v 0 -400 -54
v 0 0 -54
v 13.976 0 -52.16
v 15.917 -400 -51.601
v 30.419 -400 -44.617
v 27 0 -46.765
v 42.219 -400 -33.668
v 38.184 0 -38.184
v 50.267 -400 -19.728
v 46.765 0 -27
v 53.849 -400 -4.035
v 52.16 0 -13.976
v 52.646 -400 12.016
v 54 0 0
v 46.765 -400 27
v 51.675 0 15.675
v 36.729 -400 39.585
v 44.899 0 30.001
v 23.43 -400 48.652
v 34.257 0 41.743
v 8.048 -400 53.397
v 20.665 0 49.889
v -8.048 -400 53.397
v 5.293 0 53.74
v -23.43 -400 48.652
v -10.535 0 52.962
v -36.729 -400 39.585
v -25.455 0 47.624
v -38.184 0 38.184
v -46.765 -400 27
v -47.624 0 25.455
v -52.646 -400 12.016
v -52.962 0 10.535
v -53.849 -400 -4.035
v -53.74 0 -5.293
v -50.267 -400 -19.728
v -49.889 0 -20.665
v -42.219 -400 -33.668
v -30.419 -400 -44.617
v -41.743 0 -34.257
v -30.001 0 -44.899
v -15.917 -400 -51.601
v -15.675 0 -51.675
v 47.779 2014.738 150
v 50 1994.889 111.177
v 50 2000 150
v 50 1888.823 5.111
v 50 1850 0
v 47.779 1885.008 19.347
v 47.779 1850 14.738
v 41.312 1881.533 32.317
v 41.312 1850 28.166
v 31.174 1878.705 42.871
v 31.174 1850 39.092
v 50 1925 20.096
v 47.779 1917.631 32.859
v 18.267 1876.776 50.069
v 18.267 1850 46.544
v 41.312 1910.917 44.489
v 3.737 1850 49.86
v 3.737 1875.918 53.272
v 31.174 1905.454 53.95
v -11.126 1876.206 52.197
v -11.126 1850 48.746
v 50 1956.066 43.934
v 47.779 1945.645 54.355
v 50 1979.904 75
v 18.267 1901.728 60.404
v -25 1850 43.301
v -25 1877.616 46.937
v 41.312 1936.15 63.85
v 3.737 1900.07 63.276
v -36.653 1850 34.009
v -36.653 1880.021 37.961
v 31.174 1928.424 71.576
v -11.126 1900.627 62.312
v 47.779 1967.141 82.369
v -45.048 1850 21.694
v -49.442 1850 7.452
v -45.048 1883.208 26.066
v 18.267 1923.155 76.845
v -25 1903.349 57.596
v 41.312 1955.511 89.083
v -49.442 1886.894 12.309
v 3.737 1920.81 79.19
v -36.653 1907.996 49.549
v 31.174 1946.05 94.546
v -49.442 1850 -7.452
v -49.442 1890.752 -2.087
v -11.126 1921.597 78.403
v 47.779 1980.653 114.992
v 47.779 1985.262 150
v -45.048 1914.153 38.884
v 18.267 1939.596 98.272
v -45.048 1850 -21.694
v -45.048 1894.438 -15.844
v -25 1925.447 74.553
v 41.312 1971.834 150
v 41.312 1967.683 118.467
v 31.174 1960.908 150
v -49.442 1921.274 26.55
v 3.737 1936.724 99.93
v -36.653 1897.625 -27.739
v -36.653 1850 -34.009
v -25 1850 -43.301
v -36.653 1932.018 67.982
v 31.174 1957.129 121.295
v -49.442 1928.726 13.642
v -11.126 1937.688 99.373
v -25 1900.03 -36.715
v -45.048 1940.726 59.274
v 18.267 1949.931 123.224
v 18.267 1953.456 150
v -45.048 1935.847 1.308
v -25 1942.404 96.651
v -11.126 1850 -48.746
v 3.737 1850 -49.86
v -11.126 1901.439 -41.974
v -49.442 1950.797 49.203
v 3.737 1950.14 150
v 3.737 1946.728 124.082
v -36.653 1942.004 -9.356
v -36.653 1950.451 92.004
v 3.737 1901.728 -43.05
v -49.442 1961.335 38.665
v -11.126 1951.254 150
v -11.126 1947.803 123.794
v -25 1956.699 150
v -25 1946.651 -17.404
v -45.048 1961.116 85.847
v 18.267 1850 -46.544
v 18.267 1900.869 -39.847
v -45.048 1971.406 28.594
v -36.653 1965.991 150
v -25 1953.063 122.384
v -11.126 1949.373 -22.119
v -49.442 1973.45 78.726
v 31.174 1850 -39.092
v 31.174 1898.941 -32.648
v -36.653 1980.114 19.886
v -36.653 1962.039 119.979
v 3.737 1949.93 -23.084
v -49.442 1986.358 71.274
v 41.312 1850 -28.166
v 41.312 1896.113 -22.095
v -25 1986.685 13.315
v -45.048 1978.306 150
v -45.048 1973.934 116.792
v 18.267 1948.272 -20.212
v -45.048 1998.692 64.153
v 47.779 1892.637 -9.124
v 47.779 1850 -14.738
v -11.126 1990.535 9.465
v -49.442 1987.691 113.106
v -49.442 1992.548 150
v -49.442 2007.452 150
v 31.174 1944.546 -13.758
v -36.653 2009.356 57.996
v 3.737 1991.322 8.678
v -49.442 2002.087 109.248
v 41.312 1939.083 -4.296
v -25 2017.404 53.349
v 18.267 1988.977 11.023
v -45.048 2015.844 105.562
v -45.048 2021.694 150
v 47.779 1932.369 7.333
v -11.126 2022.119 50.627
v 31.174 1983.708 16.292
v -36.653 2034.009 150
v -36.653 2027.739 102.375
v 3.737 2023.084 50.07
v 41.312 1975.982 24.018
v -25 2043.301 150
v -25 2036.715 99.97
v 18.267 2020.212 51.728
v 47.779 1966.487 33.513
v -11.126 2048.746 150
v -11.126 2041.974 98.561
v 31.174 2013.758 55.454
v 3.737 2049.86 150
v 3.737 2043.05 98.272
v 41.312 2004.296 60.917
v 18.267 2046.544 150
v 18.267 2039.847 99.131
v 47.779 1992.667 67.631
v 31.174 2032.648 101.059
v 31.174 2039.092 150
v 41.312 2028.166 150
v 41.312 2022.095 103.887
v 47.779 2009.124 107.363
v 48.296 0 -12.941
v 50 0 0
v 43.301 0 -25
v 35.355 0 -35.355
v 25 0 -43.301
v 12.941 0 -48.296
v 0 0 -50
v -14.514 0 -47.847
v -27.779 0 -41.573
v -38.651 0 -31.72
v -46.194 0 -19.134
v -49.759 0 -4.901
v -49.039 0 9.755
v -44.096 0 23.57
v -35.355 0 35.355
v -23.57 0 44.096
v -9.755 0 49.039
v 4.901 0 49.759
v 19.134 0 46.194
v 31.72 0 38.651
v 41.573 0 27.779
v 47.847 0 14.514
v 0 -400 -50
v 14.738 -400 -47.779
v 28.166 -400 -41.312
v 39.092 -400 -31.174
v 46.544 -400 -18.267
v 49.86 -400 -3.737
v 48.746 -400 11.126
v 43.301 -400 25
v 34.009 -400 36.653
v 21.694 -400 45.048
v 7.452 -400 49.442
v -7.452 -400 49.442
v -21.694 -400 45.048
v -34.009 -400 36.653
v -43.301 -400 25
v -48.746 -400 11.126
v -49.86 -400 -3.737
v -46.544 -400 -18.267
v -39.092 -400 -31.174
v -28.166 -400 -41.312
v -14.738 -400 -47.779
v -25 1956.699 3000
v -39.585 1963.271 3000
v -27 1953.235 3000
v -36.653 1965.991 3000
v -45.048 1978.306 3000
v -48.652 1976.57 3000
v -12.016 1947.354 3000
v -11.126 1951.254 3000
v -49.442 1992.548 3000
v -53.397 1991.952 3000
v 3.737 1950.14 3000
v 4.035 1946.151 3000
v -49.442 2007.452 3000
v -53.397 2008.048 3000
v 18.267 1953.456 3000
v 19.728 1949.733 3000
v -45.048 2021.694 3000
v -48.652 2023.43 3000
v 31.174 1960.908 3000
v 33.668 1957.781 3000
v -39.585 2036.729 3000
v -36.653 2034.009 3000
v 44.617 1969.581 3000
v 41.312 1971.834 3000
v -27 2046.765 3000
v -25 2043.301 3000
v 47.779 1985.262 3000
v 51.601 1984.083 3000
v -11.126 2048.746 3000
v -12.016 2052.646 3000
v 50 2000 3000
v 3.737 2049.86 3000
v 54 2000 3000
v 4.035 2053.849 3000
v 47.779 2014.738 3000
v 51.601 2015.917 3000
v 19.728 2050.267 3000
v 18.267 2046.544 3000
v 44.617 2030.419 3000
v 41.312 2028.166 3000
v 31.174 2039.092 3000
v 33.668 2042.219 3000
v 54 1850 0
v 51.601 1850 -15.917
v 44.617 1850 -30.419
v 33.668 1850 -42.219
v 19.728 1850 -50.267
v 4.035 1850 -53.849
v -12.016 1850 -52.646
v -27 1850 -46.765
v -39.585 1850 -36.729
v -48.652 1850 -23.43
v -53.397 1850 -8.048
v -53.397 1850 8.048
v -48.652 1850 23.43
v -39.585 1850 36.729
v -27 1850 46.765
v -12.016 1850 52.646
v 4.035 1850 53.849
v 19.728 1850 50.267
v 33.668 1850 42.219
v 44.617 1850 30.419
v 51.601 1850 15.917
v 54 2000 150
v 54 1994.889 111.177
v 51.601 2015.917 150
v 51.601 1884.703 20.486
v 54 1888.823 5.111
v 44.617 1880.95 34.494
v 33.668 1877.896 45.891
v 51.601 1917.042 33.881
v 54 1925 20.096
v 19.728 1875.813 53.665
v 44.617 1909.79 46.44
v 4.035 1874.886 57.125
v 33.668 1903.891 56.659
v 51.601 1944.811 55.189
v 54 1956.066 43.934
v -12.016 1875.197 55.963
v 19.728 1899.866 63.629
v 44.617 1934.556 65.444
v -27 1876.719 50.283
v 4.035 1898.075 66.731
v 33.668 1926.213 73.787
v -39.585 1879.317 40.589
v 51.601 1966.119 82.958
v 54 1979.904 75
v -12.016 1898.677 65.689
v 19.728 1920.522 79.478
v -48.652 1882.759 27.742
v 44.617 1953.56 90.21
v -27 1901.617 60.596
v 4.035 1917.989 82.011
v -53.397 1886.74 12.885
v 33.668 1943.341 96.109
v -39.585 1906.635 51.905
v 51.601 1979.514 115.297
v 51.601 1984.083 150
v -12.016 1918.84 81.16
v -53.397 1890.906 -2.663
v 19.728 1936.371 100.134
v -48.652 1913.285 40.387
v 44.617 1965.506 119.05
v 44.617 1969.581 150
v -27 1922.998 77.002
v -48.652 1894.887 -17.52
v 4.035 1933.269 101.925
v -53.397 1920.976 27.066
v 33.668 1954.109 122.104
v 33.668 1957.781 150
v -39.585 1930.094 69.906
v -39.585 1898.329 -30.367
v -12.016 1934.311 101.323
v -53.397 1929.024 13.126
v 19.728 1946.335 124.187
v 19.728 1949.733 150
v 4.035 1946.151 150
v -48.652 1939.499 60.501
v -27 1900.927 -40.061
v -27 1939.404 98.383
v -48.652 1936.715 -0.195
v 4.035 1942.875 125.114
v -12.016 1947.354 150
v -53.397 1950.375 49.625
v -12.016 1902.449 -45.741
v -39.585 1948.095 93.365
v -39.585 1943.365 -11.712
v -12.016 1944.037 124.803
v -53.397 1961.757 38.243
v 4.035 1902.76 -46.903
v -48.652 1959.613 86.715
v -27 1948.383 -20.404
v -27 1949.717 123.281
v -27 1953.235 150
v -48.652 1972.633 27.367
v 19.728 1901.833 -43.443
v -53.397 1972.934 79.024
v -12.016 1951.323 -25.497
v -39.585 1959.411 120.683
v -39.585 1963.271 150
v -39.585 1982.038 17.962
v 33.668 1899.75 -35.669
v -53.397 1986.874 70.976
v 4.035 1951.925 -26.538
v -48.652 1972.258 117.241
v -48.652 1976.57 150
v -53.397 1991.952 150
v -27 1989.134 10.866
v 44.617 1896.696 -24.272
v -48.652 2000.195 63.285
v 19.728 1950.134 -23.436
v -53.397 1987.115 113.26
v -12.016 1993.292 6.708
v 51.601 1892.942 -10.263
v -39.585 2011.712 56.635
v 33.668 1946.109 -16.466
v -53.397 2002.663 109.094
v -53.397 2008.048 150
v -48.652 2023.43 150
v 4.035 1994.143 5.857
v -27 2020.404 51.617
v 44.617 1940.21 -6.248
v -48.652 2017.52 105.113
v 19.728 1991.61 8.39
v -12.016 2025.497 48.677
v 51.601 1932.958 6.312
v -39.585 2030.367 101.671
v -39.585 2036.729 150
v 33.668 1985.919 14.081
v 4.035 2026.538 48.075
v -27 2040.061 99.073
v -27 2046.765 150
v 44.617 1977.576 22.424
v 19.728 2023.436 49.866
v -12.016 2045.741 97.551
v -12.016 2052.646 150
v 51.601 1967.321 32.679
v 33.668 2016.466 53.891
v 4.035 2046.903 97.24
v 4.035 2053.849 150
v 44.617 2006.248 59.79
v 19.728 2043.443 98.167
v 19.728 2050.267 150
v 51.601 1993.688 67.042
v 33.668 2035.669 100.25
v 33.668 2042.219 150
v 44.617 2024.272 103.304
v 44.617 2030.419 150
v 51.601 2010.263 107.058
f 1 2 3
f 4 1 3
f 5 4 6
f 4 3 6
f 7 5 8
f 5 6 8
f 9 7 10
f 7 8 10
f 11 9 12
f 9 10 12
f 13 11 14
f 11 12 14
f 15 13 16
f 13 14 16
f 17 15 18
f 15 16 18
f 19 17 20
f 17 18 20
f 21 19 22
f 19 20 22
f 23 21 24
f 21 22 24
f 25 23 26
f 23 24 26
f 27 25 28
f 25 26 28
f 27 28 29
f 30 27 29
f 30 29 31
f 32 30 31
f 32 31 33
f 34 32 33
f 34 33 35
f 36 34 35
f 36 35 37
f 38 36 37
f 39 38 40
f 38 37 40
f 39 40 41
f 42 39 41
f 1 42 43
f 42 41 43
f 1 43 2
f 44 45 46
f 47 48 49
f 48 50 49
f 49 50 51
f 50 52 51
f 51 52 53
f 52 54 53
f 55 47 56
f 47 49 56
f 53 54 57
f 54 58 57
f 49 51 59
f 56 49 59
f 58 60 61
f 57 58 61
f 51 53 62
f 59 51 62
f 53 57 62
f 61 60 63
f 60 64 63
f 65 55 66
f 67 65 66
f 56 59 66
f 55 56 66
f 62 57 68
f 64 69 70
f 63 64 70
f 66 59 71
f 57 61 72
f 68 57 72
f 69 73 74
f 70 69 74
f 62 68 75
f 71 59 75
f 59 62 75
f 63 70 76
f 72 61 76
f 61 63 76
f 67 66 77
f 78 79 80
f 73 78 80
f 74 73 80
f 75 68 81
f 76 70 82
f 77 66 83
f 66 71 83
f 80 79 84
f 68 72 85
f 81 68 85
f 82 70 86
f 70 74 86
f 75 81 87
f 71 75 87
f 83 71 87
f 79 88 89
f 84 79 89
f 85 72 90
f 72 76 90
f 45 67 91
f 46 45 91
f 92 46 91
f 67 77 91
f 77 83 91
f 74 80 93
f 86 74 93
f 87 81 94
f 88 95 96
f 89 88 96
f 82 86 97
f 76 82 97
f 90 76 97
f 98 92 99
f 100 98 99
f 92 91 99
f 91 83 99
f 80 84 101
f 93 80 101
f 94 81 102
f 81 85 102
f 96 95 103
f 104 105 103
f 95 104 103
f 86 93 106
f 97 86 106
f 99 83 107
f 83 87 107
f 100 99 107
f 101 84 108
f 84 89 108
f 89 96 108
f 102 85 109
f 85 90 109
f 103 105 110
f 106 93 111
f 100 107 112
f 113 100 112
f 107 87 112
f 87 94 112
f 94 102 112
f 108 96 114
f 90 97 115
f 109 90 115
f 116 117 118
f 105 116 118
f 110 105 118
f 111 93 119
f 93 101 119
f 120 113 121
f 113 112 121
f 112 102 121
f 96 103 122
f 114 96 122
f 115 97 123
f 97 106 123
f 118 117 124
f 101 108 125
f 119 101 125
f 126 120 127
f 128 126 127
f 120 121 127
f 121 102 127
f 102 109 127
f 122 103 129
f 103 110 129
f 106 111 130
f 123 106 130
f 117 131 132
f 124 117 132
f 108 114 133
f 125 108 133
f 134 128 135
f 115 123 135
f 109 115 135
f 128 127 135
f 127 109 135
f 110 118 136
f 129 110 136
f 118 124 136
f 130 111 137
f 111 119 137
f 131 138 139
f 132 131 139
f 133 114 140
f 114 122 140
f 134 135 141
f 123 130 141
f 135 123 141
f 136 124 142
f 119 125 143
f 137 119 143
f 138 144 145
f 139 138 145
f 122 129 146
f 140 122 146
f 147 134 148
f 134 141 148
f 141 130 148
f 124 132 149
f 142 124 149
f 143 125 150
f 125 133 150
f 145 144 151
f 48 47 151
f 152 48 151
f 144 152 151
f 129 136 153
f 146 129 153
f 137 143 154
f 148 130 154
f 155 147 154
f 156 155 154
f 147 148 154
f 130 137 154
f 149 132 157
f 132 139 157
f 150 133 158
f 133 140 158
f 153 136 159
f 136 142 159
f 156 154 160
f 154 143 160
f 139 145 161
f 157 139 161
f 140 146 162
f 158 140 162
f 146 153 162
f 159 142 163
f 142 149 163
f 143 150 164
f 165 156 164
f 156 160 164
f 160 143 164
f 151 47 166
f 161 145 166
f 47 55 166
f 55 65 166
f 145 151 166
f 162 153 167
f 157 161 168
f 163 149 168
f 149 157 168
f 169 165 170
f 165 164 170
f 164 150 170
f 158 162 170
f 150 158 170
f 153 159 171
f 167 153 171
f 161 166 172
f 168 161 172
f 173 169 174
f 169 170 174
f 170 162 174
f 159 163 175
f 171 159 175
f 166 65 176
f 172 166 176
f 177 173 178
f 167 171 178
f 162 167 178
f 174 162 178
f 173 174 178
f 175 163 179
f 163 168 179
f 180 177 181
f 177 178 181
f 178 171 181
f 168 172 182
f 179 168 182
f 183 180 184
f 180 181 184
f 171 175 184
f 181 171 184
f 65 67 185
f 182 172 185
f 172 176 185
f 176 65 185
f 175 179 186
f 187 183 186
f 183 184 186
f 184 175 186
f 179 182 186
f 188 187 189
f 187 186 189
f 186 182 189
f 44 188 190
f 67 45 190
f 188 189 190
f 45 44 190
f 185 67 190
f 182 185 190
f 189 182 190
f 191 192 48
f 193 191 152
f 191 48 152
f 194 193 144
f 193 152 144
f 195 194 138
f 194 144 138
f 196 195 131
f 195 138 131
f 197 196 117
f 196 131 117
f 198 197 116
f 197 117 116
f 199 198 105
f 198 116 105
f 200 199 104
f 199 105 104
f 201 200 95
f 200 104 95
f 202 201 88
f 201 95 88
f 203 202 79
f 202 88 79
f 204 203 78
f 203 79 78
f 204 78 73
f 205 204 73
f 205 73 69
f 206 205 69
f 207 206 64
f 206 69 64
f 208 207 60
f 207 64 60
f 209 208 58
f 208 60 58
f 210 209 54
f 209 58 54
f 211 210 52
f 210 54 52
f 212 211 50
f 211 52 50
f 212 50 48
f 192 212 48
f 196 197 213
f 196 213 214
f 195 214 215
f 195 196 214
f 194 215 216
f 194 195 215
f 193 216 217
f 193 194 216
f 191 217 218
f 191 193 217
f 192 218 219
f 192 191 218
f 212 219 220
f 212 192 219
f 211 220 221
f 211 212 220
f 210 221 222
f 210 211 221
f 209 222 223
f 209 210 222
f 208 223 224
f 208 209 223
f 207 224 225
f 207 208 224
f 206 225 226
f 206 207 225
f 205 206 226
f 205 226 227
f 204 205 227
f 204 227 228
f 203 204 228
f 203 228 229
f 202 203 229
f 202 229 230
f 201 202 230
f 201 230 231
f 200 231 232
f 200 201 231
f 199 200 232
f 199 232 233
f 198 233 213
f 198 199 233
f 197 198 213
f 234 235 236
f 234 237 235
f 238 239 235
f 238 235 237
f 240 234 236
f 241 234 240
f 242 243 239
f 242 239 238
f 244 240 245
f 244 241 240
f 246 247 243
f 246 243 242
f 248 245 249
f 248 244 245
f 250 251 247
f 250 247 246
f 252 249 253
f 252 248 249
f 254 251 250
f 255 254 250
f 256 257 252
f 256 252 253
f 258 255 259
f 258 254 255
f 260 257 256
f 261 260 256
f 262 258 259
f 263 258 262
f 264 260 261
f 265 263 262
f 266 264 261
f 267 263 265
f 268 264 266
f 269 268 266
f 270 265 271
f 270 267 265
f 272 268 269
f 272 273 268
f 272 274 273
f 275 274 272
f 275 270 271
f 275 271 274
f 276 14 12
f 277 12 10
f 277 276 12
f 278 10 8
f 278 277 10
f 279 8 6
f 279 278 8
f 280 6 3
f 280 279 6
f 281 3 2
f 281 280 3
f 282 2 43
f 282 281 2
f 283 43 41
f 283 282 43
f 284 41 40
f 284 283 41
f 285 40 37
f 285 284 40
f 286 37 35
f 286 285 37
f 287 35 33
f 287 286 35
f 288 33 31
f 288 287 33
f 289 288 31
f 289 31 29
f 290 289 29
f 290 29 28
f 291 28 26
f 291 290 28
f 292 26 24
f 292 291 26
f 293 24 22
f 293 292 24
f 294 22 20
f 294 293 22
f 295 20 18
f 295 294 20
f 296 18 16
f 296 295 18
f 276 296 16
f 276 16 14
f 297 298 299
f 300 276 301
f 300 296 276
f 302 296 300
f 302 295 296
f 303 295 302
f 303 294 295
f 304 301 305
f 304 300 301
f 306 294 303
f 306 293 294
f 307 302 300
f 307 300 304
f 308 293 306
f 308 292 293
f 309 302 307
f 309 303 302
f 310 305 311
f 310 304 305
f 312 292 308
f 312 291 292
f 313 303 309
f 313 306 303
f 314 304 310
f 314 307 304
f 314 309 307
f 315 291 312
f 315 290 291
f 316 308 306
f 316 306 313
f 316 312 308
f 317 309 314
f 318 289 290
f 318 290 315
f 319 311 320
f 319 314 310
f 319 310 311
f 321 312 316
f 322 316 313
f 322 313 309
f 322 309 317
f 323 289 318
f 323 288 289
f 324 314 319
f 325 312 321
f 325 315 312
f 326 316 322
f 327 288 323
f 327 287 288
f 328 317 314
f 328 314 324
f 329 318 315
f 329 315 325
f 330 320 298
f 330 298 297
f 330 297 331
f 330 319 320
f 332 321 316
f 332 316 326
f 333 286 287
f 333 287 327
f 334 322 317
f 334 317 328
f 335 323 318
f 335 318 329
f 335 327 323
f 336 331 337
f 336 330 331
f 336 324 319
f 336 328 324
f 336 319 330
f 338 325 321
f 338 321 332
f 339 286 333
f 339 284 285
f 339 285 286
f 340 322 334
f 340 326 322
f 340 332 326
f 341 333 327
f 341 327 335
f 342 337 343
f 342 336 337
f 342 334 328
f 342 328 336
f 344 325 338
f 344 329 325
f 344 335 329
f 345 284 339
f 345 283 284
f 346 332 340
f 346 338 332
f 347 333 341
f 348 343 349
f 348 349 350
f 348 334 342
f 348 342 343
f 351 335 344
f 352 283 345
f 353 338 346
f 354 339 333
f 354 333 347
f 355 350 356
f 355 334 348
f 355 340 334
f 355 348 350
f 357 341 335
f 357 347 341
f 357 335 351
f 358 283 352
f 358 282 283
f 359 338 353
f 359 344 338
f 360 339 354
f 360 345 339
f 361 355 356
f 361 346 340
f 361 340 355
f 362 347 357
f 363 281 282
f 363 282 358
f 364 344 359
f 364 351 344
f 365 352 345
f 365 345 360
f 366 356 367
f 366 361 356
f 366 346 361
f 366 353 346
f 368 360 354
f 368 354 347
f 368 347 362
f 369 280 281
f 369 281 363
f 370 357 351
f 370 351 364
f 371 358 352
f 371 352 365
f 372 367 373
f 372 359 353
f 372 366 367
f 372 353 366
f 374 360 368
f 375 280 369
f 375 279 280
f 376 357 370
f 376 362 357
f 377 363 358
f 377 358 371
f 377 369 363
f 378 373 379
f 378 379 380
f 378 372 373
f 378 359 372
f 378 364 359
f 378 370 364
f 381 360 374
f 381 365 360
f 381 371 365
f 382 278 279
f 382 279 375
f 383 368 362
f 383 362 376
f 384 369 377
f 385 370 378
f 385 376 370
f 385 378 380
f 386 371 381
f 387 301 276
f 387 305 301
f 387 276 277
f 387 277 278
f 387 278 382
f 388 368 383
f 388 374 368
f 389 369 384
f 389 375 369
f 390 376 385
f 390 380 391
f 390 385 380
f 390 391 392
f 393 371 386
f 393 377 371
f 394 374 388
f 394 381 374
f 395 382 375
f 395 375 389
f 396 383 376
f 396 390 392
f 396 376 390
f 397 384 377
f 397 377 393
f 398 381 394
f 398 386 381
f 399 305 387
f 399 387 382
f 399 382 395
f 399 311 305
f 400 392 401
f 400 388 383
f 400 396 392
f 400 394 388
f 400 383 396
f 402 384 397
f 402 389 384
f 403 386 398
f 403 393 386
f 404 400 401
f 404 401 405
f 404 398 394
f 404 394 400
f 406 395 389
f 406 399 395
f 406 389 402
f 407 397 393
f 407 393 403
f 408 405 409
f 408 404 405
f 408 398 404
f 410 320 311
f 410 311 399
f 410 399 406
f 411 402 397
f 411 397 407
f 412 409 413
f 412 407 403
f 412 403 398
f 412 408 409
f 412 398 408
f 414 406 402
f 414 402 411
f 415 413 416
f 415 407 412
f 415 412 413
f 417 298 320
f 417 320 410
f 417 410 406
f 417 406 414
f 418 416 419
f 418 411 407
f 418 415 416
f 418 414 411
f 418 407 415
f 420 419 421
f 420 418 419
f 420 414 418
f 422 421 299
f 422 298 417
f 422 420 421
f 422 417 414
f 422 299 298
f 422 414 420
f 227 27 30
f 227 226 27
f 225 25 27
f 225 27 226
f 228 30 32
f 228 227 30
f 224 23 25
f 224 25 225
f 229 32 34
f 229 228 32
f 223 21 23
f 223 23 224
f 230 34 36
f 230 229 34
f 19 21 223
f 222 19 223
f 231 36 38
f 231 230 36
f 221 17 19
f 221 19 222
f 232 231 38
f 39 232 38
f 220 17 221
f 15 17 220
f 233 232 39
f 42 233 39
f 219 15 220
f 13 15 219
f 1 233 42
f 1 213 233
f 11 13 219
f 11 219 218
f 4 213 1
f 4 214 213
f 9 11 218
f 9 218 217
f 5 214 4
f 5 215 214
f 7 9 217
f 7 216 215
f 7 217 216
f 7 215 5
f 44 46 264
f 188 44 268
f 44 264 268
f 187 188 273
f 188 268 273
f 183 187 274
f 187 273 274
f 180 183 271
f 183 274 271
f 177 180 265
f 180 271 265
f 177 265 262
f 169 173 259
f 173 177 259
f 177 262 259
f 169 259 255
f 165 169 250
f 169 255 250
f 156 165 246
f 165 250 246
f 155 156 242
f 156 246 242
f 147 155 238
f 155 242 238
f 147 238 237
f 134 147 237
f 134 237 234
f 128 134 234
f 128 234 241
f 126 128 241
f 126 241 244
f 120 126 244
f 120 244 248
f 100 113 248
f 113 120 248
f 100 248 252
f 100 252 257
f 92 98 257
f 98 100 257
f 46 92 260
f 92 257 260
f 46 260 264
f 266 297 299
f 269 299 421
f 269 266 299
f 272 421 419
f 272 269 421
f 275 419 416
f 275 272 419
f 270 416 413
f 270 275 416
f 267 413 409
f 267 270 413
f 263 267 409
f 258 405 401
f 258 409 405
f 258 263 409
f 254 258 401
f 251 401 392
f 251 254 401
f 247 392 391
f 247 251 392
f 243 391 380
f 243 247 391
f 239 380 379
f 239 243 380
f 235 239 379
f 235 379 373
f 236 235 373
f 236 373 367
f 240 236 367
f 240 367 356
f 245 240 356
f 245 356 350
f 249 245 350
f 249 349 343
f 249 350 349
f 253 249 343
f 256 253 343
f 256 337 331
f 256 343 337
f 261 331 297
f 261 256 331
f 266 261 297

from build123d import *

# Parameters (mm, degrees)
SKETCH2_R           = 54
SKETCH2_R_2         = 50
SKETCH3_R           = 54
SKETCH3_R_2         = 50
BOSS_EXTRUDE1_DEPTH = 400


with BuildPart() as part:
    # Sweep1: sweep along a path in Sketch1
    with BuildLine(Plane(origin=(0, 0, 0), x_dir=(0, 0, -1), z_dir=(1, 0, 0))) as sweep1_path:
        Line((0, 0), (0, 1850))
        ThreePointArc((0, 1850), (-43.933982822, 1956.066017178), (-150, 2000))
        Line((-150, 2000), (-3000, 2000))
    # Sketch2 → Sweep1 (sweep)
    with BuildSketch(Plane(origin=(0, 0, 0), x_dir=(1, 0, 0), z_dir=(0, 1, 0))):
        Circle(SKETCH2_R)
        Circle(SKETCH2_R_2, mode=Mode.SUBTRACT)
    sweep(path=sweep1_path.line)

    # Sketch3 → Boss-Extrude1 (add)
    with BuildSketch(Plane.XZ):
        Circle(SKETCH3_R)
        Circle(SKETCH3_R_2, mode=Mode.SUBTRACT)
    extrude(amount=BOSS_EXTRUDE1_DEPTH)


solid = part.part
